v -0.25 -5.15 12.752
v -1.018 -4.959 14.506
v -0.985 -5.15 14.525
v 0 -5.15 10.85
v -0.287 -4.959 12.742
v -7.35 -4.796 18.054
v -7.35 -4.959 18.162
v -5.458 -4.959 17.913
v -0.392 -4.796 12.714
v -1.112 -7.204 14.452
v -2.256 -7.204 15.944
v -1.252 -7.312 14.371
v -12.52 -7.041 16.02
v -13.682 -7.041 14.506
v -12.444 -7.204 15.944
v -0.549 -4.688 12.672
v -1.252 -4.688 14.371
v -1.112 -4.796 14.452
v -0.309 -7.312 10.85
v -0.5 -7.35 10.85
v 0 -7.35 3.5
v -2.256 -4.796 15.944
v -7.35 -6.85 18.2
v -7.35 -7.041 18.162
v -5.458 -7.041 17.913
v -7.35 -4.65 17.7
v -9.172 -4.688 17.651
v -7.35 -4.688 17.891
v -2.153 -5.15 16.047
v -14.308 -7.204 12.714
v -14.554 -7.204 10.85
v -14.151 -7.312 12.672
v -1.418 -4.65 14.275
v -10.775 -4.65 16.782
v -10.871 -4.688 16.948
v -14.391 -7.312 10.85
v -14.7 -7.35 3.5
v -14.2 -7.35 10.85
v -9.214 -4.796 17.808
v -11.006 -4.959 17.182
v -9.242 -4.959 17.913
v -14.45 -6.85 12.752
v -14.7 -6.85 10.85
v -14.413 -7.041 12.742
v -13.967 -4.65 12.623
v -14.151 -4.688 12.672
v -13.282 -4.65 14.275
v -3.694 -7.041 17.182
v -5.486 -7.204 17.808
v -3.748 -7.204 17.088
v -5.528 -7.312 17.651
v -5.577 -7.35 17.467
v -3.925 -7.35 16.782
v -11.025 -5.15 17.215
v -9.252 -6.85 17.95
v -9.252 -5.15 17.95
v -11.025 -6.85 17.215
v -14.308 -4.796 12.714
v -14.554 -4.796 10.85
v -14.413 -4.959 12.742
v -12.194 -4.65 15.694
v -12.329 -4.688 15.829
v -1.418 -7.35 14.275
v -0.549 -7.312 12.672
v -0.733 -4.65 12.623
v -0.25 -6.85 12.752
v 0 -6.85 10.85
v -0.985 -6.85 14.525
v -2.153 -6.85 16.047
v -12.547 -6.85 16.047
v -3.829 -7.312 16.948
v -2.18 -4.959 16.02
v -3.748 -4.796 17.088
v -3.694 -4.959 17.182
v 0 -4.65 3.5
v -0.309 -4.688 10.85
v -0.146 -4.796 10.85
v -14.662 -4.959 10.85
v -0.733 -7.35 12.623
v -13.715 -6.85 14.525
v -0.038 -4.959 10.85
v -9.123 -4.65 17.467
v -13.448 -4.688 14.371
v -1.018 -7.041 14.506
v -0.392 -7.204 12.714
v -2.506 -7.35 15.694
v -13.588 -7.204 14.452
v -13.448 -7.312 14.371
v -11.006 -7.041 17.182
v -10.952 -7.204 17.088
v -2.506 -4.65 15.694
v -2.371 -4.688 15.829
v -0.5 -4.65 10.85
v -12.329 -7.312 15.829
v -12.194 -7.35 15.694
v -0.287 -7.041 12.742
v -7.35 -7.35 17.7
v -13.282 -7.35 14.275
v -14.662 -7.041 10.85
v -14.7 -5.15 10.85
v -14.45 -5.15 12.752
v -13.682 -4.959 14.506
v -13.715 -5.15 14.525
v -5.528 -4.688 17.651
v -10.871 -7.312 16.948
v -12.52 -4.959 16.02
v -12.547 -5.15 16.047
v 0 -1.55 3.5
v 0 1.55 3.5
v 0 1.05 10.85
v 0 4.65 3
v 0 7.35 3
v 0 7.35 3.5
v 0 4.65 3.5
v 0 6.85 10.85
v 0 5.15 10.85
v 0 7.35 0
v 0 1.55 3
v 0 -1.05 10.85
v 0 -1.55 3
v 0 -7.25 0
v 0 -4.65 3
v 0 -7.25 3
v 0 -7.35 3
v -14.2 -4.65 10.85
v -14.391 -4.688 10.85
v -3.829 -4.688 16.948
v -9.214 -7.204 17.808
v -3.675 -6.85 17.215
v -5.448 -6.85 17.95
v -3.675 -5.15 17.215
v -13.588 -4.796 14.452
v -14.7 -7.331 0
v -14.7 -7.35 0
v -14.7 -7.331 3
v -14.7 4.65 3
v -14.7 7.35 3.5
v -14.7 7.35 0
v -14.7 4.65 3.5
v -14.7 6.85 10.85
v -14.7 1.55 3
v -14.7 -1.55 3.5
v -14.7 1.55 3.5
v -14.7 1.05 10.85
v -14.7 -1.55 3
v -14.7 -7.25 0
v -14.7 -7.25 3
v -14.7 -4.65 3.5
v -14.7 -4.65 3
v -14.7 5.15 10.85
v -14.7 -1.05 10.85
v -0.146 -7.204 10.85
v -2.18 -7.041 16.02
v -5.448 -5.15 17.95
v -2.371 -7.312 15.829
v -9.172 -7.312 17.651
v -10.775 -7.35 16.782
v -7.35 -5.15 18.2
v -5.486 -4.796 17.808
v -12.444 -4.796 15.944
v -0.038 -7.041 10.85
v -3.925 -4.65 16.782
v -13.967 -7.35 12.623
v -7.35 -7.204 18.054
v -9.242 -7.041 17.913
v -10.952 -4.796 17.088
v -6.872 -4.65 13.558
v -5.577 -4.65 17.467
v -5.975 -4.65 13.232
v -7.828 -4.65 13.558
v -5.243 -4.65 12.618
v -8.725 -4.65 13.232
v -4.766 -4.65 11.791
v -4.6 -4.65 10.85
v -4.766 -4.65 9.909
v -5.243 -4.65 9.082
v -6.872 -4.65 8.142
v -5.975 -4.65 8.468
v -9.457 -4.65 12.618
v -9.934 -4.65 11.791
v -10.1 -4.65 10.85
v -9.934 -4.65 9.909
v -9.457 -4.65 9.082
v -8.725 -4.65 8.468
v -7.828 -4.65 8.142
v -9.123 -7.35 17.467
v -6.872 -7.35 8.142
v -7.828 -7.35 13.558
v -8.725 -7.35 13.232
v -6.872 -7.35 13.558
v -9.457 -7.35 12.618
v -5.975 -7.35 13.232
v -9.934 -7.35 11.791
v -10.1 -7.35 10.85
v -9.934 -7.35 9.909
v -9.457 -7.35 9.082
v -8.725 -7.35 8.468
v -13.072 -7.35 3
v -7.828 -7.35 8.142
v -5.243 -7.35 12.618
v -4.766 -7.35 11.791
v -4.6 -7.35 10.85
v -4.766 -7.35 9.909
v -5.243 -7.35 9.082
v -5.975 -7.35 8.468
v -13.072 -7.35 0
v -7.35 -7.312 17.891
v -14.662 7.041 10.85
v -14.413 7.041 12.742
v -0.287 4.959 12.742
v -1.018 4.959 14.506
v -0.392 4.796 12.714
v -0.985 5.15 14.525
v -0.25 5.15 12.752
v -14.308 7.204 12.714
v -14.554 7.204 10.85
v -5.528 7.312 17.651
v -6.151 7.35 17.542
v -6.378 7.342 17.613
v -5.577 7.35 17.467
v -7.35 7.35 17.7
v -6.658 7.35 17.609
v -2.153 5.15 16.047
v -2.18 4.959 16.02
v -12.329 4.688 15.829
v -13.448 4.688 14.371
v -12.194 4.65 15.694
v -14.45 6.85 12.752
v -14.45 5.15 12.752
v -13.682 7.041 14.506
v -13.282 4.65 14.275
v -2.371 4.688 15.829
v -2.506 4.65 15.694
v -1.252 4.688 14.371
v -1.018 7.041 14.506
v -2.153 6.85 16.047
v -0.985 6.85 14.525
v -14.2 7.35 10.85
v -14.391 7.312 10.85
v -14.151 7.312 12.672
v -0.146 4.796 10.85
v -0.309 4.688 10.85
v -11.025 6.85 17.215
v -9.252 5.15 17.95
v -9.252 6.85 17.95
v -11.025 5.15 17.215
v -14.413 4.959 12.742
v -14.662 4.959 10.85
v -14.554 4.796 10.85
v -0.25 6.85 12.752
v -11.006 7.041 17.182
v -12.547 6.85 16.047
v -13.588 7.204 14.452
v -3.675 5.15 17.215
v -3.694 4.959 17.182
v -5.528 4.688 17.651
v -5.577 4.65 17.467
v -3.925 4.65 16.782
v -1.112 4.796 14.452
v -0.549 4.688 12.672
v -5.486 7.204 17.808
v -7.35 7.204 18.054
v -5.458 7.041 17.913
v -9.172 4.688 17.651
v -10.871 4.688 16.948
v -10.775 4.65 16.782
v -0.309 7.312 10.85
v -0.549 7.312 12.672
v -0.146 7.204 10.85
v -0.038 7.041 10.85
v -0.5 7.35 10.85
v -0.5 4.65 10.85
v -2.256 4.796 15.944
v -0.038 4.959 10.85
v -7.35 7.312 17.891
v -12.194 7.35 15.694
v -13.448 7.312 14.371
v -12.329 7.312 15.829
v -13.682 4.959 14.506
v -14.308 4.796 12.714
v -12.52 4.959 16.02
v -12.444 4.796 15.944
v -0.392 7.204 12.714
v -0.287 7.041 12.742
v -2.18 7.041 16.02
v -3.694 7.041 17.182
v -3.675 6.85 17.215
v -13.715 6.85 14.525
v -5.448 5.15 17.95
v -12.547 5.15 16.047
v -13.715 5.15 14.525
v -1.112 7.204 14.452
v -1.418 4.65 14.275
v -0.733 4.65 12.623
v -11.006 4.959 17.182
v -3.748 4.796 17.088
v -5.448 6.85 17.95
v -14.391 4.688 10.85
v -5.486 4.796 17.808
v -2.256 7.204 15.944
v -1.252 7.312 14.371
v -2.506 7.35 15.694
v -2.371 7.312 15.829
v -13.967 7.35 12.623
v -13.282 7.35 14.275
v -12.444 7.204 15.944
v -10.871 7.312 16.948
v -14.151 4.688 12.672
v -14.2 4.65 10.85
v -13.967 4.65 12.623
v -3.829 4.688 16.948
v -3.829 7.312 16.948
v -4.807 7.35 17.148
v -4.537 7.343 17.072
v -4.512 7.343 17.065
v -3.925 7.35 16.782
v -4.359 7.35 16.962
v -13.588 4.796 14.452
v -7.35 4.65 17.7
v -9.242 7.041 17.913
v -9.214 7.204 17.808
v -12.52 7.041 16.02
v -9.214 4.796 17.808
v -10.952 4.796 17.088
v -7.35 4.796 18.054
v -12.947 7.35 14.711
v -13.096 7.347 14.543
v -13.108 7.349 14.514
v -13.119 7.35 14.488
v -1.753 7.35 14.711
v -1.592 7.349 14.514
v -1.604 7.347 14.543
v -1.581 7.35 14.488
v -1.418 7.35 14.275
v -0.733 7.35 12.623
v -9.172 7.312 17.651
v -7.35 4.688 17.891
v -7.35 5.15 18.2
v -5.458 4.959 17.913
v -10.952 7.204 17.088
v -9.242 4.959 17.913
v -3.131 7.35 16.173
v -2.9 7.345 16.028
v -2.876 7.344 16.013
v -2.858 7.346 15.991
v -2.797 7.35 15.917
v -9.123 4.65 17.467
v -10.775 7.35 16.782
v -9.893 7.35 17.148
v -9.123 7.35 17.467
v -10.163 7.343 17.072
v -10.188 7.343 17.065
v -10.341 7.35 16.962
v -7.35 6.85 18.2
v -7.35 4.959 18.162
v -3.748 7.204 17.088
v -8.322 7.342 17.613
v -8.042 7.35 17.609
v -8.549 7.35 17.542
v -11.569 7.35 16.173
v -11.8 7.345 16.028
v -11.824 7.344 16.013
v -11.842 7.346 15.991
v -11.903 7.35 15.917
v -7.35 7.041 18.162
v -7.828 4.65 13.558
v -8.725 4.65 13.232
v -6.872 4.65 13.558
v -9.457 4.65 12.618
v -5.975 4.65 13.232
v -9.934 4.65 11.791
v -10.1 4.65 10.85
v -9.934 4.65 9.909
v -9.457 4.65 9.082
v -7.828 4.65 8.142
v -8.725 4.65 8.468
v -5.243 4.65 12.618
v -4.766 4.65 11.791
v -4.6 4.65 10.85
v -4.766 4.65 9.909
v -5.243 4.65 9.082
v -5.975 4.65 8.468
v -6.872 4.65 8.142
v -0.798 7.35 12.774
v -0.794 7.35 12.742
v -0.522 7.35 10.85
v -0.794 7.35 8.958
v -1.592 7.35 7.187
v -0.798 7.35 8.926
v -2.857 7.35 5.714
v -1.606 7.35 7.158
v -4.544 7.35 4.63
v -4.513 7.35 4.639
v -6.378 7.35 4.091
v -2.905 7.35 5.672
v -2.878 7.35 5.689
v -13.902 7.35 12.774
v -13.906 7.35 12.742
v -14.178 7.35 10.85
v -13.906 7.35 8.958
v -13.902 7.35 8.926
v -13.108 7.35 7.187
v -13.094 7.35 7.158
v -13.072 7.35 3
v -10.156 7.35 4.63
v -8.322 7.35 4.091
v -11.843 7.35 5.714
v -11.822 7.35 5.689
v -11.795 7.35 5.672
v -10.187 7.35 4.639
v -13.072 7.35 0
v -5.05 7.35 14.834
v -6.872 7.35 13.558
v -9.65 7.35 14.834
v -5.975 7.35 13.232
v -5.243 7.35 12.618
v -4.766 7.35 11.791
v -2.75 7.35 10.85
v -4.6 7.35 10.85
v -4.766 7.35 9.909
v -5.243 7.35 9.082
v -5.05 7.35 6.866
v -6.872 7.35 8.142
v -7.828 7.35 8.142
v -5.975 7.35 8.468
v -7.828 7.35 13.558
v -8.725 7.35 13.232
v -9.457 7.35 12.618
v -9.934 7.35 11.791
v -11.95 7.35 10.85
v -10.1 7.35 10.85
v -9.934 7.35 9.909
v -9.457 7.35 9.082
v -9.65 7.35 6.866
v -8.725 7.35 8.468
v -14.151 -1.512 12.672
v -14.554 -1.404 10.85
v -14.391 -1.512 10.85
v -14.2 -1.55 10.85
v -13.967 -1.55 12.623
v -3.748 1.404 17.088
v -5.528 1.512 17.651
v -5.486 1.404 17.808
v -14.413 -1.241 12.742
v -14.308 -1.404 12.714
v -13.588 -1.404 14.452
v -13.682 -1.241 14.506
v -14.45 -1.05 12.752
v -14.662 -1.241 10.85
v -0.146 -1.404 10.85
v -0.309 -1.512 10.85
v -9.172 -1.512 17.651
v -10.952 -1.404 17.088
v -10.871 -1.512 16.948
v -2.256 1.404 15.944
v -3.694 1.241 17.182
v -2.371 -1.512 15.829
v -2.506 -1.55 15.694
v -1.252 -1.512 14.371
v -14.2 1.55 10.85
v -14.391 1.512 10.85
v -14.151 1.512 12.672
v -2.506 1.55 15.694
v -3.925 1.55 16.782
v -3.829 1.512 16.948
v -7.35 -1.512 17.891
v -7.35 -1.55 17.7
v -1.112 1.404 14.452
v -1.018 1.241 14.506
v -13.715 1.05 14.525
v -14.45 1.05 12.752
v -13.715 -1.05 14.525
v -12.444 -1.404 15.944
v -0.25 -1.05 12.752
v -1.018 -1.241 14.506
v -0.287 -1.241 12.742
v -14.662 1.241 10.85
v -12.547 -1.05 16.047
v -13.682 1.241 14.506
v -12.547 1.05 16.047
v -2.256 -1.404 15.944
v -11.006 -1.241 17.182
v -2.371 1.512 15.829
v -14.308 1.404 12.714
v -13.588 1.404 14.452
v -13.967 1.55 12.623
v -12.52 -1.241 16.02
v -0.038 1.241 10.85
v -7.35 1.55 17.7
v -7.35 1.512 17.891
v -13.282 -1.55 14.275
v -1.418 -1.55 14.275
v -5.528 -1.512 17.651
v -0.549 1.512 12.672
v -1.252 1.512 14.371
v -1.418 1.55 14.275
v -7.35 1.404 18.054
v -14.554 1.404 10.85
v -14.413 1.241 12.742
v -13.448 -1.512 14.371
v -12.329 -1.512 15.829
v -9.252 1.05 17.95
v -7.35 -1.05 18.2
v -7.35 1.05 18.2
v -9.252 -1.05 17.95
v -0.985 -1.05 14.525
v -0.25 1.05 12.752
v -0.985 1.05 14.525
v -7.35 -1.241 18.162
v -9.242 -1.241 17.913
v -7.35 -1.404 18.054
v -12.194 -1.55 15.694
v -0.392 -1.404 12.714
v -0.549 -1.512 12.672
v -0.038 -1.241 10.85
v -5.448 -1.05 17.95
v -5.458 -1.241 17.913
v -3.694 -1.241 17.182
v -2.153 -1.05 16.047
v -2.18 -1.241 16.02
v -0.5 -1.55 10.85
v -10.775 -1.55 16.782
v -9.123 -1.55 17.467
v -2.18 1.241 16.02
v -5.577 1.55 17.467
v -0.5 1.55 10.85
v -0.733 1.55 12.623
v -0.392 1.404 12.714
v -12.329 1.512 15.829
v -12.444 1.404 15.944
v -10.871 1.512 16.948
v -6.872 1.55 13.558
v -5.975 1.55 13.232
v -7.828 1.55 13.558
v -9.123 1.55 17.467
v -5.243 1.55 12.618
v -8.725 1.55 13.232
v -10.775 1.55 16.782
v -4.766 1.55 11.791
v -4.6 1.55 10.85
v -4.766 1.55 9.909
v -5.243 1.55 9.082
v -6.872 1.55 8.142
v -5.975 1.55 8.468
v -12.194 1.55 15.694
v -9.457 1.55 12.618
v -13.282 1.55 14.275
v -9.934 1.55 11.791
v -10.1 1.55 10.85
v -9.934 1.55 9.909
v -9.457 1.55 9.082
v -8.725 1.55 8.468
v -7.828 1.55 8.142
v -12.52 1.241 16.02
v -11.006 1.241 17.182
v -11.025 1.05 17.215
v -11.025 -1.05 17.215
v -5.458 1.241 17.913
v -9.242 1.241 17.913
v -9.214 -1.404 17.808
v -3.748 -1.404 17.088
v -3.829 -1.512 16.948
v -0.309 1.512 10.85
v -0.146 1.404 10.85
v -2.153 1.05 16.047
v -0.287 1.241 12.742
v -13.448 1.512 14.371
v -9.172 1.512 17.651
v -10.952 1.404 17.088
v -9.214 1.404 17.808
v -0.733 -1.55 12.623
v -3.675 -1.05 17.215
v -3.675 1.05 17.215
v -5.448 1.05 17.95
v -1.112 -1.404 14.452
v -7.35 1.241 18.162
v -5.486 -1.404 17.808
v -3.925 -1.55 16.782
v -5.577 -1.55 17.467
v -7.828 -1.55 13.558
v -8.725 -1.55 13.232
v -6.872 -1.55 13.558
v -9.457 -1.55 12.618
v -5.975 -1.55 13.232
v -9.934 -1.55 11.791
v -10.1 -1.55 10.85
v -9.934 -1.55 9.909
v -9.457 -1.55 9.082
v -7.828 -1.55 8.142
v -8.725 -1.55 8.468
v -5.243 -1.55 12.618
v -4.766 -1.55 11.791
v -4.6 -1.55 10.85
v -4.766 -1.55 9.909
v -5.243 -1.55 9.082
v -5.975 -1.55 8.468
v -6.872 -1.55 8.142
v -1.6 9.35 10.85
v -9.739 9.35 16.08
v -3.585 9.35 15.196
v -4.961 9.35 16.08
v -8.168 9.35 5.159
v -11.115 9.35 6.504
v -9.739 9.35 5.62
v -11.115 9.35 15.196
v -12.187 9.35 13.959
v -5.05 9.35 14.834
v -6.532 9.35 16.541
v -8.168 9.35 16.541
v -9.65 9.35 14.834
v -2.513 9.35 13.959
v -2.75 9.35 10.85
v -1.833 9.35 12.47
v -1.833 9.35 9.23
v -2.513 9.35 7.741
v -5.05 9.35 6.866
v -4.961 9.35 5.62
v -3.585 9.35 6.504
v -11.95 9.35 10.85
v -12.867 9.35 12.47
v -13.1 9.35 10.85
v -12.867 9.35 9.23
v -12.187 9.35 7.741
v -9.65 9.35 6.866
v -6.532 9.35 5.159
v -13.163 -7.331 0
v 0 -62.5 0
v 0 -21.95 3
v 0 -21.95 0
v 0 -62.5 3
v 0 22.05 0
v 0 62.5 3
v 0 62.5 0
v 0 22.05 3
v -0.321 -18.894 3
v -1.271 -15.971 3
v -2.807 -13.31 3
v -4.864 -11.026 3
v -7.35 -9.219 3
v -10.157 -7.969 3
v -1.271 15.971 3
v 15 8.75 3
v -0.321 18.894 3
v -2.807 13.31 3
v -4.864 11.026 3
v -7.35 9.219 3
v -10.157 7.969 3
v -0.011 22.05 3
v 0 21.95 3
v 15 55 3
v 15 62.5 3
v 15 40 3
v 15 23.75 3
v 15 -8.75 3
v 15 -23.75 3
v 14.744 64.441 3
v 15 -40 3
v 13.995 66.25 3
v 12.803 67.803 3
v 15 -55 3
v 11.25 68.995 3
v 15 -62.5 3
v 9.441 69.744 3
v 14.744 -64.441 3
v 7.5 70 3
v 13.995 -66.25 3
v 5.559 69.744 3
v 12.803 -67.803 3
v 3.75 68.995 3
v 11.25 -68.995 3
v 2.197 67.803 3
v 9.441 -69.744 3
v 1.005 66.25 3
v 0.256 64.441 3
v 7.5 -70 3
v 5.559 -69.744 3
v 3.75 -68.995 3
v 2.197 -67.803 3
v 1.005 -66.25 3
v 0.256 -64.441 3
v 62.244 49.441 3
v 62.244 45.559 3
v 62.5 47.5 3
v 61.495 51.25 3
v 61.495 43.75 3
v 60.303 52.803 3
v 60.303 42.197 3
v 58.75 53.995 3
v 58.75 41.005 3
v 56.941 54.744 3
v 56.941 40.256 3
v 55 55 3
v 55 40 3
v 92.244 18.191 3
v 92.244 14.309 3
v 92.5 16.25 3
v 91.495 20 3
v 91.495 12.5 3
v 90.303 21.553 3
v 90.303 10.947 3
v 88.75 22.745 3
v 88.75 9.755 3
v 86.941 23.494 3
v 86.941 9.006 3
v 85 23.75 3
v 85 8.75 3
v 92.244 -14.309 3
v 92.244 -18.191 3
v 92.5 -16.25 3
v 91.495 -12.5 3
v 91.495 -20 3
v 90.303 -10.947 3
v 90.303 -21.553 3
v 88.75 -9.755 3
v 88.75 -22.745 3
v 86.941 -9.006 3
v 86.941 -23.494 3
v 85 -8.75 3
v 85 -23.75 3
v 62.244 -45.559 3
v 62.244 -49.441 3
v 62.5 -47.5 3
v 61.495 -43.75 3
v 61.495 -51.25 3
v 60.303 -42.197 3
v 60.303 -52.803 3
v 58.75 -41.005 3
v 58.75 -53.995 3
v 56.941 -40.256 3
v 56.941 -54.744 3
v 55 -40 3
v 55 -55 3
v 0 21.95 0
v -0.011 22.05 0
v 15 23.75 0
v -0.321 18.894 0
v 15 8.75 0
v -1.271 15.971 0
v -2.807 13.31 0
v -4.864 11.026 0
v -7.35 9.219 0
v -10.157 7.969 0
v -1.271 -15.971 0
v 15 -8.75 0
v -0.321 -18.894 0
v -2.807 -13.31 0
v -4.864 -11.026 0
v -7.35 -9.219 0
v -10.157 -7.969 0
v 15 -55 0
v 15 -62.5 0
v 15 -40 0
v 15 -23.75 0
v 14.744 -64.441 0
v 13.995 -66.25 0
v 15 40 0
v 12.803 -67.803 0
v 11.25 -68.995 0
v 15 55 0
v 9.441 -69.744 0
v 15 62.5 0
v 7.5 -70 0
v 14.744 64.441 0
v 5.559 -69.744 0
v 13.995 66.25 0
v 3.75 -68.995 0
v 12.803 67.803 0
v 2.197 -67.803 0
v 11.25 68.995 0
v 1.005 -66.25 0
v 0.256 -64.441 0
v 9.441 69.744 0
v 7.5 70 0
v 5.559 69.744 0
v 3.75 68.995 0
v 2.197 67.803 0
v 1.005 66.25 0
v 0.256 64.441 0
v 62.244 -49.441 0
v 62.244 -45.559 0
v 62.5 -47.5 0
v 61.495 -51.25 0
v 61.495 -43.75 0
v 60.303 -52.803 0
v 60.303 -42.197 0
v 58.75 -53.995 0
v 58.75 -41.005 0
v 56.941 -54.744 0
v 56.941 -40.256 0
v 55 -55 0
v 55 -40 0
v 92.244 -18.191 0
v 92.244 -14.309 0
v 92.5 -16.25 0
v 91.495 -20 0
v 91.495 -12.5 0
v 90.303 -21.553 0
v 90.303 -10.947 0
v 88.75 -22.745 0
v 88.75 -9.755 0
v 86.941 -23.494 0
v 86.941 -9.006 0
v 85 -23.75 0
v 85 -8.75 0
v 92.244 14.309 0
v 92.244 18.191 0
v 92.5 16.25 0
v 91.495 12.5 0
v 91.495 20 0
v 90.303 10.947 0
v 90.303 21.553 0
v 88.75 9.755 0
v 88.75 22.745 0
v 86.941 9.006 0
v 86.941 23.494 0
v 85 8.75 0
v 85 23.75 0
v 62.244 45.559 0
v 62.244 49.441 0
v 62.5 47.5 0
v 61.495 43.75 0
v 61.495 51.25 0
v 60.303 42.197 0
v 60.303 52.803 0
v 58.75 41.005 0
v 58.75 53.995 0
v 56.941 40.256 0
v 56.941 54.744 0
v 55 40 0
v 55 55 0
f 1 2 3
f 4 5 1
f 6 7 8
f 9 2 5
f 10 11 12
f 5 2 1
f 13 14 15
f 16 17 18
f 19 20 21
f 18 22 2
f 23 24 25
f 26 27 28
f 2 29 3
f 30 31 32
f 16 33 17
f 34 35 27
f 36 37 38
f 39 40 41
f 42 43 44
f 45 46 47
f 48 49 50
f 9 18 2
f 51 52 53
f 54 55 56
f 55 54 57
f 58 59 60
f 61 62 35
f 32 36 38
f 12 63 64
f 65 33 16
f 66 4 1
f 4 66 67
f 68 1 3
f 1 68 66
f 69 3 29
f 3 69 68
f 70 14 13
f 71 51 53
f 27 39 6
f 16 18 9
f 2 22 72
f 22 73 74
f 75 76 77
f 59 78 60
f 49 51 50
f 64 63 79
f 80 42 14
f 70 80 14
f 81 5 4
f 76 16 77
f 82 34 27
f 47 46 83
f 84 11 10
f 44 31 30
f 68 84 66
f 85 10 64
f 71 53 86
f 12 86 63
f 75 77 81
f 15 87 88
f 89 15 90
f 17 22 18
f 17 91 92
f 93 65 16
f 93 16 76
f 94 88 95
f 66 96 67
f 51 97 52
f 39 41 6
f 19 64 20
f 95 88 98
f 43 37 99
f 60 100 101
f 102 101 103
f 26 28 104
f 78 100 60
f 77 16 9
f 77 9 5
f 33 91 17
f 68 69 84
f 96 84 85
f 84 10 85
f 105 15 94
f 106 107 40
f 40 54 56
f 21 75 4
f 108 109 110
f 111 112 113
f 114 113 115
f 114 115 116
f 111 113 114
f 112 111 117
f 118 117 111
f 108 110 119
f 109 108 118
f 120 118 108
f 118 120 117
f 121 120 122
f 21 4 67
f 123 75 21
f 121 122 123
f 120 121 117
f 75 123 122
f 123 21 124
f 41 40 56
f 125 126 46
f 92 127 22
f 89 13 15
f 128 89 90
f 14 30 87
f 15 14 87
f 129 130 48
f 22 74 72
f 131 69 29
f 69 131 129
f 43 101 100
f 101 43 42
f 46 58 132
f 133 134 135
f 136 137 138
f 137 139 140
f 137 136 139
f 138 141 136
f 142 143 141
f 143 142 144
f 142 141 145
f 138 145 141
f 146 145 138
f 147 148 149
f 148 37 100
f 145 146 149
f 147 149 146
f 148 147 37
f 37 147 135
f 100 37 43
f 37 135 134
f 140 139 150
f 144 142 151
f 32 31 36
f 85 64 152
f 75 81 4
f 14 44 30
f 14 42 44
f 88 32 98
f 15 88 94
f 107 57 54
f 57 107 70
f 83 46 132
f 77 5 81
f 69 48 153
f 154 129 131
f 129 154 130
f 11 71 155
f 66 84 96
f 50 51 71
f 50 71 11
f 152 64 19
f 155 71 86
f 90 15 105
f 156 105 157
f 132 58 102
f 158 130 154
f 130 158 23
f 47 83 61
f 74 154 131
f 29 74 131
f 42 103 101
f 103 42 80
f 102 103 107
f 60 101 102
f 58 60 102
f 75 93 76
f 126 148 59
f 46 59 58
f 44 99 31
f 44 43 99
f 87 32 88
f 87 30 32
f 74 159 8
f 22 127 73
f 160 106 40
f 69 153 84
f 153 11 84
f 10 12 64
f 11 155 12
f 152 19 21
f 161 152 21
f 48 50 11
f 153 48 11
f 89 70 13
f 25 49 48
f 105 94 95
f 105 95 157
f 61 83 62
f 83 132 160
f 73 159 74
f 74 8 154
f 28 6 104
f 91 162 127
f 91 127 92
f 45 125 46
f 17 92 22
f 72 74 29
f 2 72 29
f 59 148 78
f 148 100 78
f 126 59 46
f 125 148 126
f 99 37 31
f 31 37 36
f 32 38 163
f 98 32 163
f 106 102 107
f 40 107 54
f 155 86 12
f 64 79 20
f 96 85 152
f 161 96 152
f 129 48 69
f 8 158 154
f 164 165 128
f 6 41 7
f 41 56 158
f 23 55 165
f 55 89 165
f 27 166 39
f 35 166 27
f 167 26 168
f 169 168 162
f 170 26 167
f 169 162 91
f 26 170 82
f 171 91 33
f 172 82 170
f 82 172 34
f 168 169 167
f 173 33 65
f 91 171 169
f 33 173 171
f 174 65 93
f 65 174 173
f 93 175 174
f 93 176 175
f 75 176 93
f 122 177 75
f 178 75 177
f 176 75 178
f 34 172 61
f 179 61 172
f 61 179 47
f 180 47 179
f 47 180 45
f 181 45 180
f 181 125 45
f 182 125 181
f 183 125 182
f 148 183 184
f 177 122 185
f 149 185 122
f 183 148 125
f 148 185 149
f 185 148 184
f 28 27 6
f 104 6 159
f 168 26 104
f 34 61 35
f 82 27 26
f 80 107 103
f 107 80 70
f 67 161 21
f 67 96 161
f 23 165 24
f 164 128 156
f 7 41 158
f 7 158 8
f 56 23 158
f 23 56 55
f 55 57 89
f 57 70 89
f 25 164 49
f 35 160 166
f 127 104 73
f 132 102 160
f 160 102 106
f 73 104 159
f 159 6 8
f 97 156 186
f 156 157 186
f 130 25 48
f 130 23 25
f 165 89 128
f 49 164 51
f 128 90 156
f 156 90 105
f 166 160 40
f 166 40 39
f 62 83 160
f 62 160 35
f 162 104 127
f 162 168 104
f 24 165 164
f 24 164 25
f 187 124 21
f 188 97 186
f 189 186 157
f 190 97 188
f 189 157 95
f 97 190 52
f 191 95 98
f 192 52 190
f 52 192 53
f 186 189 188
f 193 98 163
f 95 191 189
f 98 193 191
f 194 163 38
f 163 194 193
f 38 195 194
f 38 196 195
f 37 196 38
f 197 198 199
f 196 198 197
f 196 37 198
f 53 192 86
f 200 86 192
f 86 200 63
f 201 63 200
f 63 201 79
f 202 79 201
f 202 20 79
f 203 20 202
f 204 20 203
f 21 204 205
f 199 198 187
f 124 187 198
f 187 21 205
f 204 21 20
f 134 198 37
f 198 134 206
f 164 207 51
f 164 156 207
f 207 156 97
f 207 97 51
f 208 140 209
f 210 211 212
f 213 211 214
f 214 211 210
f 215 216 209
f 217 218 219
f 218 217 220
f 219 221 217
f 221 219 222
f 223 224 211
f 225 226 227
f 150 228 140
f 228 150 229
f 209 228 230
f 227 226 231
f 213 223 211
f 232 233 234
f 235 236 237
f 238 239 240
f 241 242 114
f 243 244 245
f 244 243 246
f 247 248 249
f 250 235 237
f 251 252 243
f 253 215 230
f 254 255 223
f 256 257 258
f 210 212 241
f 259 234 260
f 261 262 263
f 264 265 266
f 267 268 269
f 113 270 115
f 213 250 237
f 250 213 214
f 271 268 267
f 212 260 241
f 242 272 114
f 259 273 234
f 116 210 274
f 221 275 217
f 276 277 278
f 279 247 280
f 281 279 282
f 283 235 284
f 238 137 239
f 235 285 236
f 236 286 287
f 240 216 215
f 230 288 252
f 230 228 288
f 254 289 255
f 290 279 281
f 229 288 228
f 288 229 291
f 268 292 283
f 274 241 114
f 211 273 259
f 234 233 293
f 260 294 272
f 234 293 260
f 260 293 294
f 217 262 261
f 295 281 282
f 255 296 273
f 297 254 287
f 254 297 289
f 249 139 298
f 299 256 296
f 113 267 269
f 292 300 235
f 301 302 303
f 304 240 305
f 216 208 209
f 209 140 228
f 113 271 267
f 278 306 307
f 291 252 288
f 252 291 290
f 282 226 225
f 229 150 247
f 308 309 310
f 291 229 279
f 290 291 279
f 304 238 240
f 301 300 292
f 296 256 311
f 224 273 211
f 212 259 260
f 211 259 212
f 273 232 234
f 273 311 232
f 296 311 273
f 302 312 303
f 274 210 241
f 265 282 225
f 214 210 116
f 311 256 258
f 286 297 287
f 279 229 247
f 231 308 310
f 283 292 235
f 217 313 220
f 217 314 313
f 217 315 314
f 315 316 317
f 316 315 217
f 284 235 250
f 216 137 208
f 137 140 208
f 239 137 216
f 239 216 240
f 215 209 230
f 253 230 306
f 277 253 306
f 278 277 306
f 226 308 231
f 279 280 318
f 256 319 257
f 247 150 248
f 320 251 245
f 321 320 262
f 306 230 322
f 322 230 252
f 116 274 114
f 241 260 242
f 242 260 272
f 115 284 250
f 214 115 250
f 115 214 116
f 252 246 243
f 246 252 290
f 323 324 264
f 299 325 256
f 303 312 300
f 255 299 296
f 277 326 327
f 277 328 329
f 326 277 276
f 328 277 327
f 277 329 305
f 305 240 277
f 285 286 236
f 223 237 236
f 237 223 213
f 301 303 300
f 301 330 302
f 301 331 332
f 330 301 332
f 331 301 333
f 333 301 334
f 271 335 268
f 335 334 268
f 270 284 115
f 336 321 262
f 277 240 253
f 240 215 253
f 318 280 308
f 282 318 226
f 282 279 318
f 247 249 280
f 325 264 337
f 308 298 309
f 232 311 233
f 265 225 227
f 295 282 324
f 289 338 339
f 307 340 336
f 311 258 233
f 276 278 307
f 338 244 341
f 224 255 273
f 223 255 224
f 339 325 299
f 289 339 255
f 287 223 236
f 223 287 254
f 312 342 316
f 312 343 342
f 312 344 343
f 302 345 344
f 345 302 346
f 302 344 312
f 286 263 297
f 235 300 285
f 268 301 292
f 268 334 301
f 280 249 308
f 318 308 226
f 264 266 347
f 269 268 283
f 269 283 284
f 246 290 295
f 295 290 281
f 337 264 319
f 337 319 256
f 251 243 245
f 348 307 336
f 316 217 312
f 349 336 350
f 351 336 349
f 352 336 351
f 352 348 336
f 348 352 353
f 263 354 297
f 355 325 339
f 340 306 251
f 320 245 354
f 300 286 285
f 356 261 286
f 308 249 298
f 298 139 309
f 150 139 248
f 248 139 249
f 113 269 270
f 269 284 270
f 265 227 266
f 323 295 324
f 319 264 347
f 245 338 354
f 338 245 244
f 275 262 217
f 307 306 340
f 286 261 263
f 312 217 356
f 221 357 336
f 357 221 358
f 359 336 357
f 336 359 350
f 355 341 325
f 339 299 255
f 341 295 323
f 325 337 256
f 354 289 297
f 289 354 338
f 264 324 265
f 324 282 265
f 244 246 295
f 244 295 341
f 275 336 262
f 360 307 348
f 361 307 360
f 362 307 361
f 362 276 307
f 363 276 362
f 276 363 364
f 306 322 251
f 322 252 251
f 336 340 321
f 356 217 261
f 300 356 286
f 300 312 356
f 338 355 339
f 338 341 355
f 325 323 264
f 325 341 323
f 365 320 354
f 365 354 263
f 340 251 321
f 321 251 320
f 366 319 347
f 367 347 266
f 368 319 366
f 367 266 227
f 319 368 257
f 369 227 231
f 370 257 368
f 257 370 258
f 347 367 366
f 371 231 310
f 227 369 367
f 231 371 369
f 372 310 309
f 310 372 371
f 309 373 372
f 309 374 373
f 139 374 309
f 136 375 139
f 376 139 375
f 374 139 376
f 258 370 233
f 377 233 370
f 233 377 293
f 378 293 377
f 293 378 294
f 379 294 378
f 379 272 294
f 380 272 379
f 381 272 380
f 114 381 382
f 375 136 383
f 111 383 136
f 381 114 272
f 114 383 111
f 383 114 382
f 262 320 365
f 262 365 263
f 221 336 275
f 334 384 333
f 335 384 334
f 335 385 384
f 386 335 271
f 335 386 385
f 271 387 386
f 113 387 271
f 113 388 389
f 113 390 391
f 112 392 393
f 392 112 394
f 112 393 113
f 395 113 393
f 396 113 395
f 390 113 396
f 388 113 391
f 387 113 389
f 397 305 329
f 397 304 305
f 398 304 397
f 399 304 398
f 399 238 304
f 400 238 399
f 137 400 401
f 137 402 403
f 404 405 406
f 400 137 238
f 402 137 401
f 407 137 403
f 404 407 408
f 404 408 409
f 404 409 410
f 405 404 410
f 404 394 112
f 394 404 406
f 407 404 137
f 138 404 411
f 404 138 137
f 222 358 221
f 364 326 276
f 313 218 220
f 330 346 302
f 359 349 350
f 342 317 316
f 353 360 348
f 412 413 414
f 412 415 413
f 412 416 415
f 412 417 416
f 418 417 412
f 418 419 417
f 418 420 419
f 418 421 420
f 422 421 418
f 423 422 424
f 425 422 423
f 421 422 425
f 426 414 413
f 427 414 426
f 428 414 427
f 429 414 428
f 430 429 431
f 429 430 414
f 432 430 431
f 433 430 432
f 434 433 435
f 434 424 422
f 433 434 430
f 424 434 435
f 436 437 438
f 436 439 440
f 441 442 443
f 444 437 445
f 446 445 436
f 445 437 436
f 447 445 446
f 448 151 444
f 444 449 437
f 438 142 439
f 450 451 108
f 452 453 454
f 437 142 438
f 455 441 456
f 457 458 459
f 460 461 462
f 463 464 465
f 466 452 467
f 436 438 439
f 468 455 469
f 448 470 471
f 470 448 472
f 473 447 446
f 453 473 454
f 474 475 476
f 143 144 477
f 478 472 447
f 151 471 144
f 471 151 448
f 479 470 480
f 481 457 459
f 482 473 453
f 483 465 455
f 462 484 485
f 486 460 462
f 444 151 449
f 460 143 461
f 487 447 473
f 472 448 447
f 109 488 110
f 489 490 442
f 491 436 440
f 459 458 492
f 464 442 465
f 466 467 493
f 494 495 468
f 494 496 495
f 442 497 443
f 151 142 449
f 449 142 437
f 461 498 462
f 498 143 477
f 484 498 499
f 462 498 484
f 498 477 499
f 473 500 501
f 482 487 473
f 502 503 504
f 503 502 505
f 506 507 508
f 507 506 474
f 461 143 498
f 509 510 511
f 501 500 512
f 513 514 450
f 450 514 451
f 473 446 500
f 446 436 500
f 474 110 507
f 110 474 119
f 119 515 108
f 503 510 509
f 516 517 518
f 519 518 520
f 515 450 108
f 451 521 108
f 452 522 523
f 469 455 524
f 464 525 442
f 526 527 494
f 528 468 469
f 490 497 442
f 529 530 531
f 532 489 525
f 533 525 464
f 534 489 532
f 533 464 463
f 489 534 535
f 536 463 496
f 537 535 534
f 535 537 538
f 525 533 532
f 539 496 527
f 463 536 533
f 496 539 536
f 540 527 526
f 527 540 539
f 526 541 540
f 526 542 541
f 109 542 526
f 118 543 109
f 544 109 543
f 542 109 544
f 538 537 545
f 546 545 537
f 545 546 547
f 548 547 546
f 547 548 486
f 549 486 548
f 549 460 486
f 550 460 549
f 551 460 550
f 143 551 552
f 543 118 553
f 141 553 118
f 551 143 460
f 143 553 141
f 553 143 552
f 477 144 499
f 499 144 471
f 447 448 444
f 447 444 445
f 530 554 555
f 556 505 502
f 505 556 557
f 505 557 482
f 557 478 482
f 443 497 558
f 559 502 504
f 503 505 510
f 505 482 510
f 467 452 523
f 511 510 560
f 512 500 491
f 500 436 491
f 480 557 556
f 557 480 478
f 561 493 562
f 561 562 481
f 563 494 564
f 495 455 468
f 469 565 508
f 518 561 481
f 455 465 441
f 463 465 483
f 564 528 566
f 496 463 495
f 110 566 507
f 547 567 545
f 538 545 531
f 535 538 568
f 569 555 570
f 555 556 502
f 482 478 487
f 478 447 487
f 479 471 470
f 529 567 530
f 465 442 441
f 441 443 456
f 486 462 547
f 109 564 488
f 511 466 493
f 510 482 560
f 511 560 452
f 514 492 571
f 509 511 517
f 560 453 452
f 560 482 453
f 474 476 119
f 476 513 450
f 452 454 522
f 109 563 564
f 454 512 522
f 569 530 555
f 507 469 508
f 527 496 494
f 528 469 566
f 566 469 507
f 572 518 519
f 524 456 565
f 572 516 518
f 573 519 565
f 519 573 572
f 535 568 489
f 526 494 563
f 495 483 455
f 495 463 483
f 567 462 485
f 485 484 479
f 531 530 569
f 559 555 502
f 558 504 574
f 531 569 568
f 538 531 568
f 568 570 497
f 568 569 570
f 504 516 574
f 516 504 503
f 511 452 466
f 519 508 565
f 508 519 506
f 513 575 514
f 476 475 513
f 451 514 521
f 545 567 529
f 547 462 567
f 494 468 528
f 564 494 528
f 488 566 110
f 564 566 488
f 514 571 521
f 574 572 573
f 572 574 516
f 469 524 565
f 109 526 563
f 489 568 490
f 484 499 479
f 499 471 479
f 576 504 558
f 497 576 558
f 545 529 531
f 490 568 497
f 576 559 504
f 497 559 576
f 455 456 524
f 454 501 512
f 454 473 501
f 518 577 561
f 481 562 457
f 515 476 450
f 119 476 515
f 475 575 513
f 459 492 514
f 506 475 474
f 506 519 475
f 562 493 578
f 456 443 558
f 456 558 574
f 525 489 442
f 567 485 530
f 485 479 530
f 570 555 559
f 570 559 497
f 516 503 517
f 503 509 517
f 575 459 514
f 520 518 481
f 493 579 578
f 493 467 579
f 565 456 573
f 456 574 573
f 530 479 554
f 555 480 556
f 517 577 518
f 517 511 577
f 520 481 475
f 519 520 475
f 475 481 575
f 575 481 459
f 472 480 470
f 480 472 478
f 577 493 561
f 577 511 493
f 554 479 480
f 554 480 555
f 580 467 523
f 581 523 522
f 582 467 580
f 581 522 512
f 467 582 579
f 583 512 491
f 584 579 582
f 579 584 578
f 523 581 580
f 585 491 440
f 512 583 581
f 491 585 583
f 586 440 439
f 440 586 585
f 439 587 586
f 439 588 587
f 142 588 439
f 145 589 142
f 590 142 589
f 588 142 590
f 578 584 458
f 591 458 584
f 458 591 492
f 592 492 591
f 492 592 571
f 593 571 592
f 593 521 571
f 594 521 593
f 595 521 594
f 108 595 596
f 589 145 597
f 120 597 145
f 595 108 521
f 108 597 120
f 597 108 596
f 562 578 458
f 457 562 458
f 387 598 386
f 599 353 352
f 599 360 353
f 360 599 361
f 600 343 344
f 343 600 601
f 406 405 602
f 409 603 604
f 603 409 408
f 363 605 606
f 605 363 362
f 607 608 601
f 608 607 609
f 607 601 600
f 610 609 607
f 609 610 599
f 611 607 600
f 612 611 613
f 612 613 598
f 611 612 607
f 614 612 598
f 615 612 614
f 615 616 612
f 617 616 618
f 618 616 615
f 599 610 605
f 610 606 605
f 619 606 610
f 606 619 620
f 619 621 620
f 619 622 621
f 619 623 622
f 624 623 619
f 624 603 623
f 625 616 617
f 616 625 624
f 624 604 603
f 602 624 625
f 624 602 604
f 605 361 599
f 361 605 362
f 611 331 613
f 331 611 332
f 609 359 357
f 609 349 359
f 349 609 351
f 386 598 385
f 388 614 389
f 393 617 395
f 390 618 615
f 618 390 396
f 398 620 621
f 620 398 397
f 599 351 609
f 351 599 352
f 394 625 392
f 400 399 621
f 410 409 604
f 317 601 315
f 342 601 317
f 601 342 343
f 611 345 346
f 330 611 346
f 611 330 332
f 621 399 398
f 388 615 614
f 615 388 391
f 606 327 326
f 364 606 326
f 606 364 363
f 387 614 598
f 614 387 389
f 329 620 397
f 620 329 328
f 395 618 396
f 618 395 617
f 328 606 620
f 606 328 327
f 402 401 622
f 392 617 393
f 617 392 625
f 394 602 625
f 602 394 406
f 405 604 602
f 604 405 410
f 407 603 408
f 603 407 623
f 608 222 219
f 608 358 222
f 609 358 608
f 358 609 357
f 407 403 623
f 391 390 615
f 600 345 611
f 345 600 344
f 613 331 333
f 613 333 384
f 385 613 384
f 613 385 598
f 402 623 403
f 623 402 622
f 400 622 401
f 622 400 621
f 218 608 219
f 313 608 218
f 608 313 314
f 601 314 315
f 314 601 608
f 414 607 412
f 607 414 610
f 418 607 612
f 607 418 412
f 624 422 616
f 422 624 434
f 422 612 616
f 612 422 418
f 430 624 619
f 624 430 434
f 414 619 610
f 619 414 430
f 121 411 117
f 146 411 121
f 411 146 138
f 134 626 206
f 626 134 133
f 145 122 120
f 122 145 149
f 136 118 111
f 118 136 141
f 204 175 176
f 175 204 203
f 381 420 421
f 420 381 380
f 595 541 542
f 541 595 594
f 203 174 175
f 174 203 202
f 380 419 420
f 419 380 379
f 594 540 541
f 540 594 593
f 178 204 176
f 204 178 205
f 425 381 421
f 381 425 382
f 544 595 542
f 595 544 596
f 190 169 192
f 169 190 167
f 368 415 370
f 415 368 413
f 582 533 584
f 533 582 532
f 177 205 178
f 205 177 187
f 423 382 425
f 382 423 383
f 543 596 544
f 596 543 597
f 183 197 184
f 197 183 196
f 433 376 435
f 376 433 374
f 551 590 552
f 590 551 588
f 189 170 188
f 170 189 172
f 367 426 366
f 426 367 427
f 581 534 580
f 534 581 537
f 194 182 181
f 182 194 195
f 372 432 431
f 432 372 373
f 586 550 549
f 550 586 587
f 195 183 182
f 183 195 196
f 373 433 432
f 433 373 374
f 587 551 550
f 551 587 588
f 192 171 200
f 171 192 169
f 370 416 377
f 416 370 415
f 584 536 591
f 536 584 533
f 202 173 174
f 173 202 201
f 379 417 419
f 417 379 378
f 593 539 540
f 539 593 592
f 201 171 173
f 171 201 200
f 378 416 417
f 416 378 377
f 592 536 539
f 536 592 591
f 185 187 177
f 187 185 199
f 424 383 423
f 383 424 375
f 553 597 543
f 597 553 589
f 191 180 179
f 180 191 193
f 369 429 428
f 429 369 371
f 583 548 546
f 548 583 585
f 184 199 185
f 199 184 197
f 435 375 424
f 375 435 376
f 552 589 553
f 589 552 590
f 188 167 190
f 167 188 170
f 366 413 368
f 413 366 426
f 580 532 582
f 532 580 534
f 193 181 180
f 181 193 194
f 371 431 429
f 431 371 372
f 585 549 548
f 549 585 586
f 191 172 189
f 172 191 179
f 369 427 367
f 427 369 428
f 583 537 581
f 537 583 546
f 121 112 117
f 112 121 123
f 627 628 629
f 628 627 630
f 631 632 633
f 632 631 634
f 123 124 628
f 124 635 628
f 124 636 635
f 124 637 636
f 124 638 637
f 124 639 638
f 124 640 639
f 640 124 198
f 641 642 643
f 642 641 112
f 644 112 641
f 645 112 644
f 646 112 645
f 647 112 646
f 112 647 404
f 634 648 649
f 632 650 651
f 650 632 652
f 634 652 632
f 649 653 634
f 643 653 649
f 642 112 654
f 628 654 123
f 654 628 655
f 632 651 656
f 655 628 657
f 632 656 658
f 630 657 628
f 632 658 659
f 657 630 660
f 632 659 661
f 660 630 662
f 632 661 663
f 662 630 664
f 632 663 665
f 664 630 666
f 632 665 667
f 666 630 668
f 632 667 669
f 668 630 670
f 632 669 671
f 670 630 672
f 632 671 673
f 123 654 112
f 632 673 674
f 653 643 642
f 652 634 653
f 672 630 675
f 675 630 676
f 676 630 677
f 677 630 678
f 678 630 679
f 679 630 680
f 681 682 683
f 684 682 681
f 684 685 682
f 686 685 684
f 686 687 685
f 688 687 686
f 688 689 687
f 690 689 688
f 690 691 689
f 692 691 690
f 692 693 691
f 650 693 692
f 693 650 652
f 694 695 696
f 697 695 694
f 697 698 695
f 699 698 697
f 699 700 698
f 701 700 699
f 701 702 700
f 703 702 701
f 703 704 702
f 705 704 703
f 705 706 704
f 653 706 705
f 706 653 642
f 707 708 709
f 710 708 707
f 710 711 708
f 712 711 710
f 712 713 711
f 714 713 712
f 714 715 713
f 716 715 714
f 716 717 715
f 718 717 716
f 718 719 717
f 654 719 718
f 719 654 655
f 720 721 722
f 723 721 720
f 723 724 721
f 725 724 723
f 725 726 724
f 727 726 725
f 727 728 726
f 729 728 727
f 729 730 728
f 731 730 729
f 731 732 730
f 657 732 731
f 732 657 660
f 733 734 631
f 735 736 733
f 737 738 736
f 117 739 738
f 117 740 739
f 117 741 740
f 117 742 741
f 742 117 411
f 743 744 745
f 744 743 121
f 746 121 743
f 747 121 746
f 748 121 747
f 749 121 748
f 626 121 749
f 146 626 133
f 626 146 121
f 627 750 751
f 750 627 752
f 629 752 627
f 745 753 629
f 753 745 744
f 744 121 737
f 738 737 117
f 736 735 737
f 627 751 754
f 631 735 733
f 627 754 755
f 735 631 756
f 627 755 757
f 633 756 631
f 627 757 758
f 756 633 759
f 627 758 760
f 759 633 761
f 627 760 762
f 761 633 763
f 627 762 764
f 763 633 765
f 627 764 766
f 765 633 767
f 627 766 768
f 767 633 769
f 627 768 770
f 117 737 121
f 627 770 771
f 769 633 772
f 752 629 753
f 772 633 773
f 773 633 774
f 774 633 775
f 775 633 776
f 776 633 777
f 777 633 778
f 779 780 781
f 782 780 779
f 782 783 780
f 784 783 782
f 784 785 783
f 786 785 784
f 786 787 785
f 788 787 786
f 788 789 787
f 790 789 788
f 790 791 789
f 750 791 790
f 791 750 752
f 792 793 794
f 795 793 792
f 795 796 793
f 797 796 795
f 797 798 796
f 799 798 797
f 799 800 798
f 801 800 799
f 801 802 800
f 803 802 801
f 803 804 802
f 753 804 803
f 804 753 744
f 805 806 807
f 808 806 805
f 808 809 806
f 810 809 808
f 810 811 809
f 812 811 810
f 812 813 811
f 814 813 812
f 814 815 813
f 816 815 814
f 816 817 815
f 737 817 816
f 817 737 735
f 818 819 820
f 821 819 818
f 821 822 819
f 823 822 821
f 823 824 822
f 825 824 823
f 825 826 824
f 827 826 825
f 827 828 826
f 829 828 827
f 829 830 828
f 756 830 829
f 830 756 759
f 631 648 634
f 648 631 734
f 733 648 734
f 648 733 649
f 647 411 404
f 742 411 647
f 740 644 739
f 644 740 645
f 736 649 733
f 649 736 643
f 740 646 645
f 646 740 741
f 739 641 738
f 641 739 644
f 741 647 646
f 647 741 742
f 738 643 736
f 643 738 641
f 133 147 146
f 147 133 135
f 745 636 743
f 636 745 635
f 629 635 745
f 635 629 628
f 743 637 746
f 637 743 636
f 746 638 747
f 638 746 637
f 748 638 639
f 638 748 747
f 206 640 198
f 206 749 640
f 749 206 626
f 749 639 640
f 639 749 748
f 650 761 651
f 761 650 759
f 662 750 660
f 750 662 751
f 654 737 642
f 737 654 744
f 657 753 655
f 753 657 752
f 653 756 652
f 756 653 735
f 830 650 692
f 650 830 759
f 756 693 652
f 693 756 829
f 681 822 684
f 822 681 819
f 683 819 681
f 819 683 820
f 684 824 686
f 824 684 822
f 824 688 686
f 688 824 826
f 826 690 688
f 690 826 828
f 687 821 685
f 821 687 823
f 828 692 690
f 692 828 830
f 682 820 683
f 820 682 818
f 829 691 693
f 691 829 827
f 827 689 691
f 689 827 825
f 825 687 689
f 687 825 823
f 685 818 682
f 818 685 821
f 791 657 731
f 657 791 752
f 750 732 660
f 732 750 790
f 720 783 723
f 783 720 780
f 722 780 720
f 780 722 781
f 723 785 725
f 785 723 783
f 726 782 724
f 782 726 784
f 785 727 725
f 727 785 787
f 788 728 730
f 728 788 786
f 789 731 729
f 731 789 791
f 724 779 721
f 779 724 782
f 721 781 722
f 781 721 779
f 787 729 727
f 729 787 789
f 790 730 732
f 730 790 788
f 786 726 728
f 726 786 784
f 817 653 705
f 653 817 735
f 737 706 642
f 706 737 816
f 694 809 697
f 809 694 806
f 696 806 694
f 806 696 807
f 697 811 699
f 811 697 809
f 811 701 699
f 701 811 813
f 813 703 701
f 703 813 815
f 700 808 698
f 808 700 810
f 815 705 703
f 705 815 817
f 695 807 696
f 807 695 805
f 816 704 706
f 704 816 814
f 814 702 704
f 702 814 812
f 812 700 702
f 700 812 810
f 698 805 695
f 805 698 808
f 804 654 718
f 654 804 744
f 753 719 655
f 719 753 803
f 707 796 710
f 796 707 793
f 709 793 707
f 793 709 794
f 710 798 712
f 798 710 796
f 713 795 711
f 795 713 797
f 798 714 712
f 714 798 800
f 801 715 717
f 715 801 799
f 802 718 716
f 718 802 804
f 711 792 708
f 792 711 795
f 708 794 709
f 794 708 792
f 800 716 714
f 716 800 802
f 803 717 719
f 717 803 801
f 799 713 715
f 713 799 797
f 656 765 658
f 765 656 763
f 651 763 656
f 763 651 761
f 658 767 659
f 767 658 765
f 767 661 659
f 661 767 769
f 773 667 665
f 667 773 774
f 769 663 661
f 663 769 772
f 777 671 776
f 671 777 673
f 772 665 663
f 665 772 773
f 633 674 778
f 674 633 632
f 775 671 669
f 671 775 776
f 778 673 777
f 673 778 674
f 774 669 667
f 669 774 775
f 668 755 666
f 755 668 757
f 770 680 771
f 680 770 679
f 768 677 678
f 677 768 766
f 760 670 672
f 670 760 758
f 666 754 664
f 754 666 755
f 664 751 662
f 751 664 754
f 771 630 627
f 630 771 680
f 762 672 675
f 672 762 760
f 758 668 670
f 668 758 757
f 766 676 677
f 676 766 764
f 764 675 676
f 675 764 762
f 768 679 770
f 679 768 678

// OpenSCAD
/* [Main] */
bar_length=125;
bar_width=15;
bar_height=3;
outer_finger_length=40;
inner_finger_length=70;

//gopro connector
rotate([-90,0,0])
translate([-gopro_connector_x/2,-gopro_connector_y-0.5,0])
    gopro_connector("triple");

//adapter supports
difference(){
translate([-gopro_connector_x,gopro_connector_x/2,0])
    cube([gopro_connector_x,gopro_connector_x,3]);
translate([-gopro_connector_x,gopro_connector_x*1.5-0.1,0])
    cylinder(h=3,r=gopro_connector_x);
}

difference(){
translate([-gopro_connector_x,-gopro_connector_x*1.5+0.1,0])
    cube([gopro_connector_x,gopro_connector_x,3]);
translate([-gopro_connector_x,-gopro_connector_x*1.5+0.1,0])
    cylinder(h=3,r=gopro_connector_x);
}


bar(bar_length, bar_width, bar_height, outer_finger_length, inner_finger_length);

module finger(bar_width, length, width, height, gap) {
    translate([bar_width,(gap/2)-width,0])
        cube([length,width,height]);
    translate([bar_width+length,(gap/2)-width/2,0])
        cylinder(h=height,r=width/2);
}

module bar(length, width, height, outer_finger_length, inner_finger_length) {
    translate([0,-length/2,0])
        cube([width,length,height]);
    
    //rounded ends
    translate([width/2,length/2,0])
        cylinder(h=height,r=width/2);
    translate([width/2,-length/2,0])
        cylinder(h=height,r=width/2);
    
    //fingers
    finger(width, outer_finger_length, width, height, length-width);
    finger(width, outer_finger_length, width, height, -length+width*3);
    finger(width, inner_finger_length, width, height, length/2-width);
    finger(width, inner_finger_length, width, height, -length/2+width*3);
}


//GoPro connector library
/* [Rod and captive nut] */

// This tab is useful only if you have selected "rod" as the secondary head. The optional rod diameter (also the captive nut internal diameter)
gopro_captive_rod_id= 3.8;
// The angle the rod makes with the axis (0 is colinear, 90 is a right angle)
gopro_captive_rod_angle= 45; // [0:90]
// Optional captive nut thickness with freeplay (tightest would be 3.2)
gopro_rod_nut_th= 3.6;
// Optional captive nut diameter with freeplay (from corner to corner)
gopro_rod_nut_od= 8.05;
// How much is the protruding output of the rod on the rod attachment (can be zero), useful if you don't want a captive nut with still a tight coupling
gopro_captive_protruding_h= 0.5;

/* [Clamp/bar mount] */

// This tab is useful only if you have selected "clamp" as the secondary head.  The optional (handle)bar diameter
gopro_bar_rod_d= 31;
// How thick is the ring around the bar
gopro_bar_th= 3.2;
// How big is the gap between the jaws
gopro_bar_gap= 2.4;
// The jaw screw diameter
gopro_bar_screw_d= 3;
// The diameter of the head of the screw
gopro_bar_screw_head_d= 6.2;
// The diameter of the nut of the screw from corner to corner (can be zero)
gopro_bar_screw_nut_d= 6.01;
// How thick are the shoulders on which to bolt (each side)
gopro_bar_screw_shoulder_th=4.5;
// Whether to reverse the bolt orientation (from which side you will screw the bolt, defaut is from the joint)
gopro_bar_screw_reversed=false; // [true,false]

/* [Hidden] */

// The gopro connector itself (you most probably do not want to change this but for the first two)

// The locking nut on the gopro mount triple arm mount (keep it tight)
gopro_nut_d= 9.2;
// How deep is this nut embossing (keep it small to avoid over-overhangs)
gopro_nut_h= 2;
// Hole diameter for the two-arm mount part
gopro_holed_two= 5;
// Hole diameter for the three-arm mount part
gopro_holed_three= 5.5;
// Thickness of the internal arm in the 3-arm mount part
gopro_connector_th3_middle= 3.1;
// Thickness of the side arms in the 3-arm mount part
gopro_connector_th3_side= 2.7;
// Thickness of the arms in the 2-arm mount part
gopro_connector_th2= 3.04;
// The gap in the 3-arm mount part for the two-arm
gopro_connector_gap= 3.1;
// How round are the 2 and 3-arm parts
gopro_connector_roundness= 1;
// How thick are the mount walls
gopro_wall_th= 3;

gopro_connector_wall_tol=0.5+0;
gopro_tol=0.04+0;

// Can be queried from the outside
gopro_connector_z= 2*gopro_connector_th3_side+gopro_connector_th3_middle+2*gopro_connector_gap;
gopro_connector_x= gopro_connector_z;
gopro_connector_y= gopro_connector_z/2+gopro_wall_th;

///////////////////////////////////////////////////////////////////////
//
// GoPro Hero mount and joint (gopro_mounts_mooncactus.scad) - Rev 1.03
//
///////////////////////////////////////////////////////////////////////
//
// CC-BY-NC 2013 jeremie.francois@gmail.com
// http://www.thingiverse.com/thing:62800
// http://betterprinter.blogspot.com
//

// It slices neatly on an ultimaker with the following parameters
//
// 0.1 mm layers (for better look & more compact FDM) -- 0.15 is still OK (and faster)
// 0.8 mm walls (loops->infill->perimeters)
// 0.8 mm bottom/top
// 100% fill (probably safer, though 30% is quite OK)
//
// Rev 1.01: fixed printing angle vs captive nut slot, added a slight freeplay
// Rev 1.02: added handle/bar mount and rounded the angles of the rod mount
// Rec 1.03: examples and first release (20130317-1234)

/* ****************************************************************

HOW TO USE IN YOUR OWN DESIGNS

use <gopro_mounts_mooncactus.scad>

// Create a "triple" gopro connector
gopro_connector("triple");

// Create a "triple" gopro connector without the locking nut shape
translate([30,0,0])
	gopro_connector("triple", withnut=false);

// Create a "double" gopro connector
translate([60,0,0])
	gopro_connector("double");

// Add a bar mount/clamp to one of the connector
translate([90,0,0])
gopro_bar_clamp(
	rod_d= 31, // rod diameter
	th= 3.2, // main thickness
	gap= 2.4, // space between the clamps
	screw_d= 3, // screw diameter
	screw_head_d= 6.2, // screw head diameter
	screw_nut_d= 6.01, // nut diameter from corner to corner
	screw_shoulder_th=4.5, // thickness of the shoulder on which the nut clamps
	screw_reversed=false	 // true to mirror the orientation of the clamp bolts
);

// Extends a connector with a mount for a rod and an optional embedded nut
translate([120,0,0])
gopro_rod_connect(
	rod_id=3.8, // rod diameter
	angle=80,  // rod angle (0 is straight, 90 is a right turn)
	nut_th=3.2, // embedded nut thickness (can be zero to disable the embedded nut)
	nut_od=7.9 // nut diameter from corner to corner
);

// How to build a linear extruded bar extender
translate([0,65,0])
{
	gopro_connector("double");
	gopro_extended(len=50, th=3)
		scale([1,-1,1])
				gopro_connector("triple");
}

// The following dimensions are useful to attach the mount to your design:
	gopro_connector_z= 14.7;
	gopro_connector_x= 14.7;
	gopro_connector_y= 10.35;


// Finally, note that the arm are designed in a way which is not the best orientation to print: you would better rotate them with, eg. rotate([0,90,0])

**************************************************************** */



// To generate the sample set in bash, just copy/paste the following in a terminal:
/*
for kind in double triple; do
	for angle in 30 80; do
		through=true
		[[ $angle == 0 ]] && through=false
		openscad -D print_it=true -D gopro_primary="\"$kind\"" -D gopro_captive_rod_angle=$angle -o gmb_${kind}_${angle}.stl gopro_mount_bit.scad
	done
	openscad -D print_it=true -D gopro_primary="\"$kind\"" -D gopro_rod_nut_th=0 -o gmb_${kind}_simple.stl gopro_mount_bit.scad
done
*/


//
// ============================= GOPRO CONNECTOR =============================
//

module gopro_torus(r,rnd)
{
	translate([0,0,rnd/2])
		rotate_extrude(convexity= 10)
			translate([r-rnd/2, 0, 0])
				circle(r= rnd/2, $fs=0.2);
}

module gopro_rcyl(r,h, centered, rnd=1)
{
	translate([0,0,center ? -h/2 : 0])
	hull() {
		translate([0,0,0]) gopro_torus(r=r, rnd=rnd);
		translate([0,0,h-rnd]) gopro_torus(r=r, rnd=rnd);
	}
}

module gopro_connector(version="double", withnut=true, captive_nut_th=0, captive_nut_od=0, captive_rod_id=0, captive_nut_angle=0)
{
	module gopro_profile(th)
	{
		hull()
		{
			gopro_torus(r=gopro_connector_z/2, rnd=gopro_connector_roundness);
			translate([0,0,th-gopro_connector_roundness])
				gopro_torus(r=gopro_connector_z/2, rnd=gopro_connector_roundness);
			translate([-gopro_connector_z/2,gopro_connector_z/2,0])
				cube([gopro_connector_z,gopro_wall_th,th]);
		}
	}
	difference()
	{
		union()
		{
			if(version=="double")
			{
				for(mz=[-1:2:+1]) scale([1,1,mz])
						translate([0,0,gopro_connector_th3_middle/2 + (gopro_connector_gap-gopro_connector_th2)/2]) gopro_profile(gopro_connector_th2);
			}
			if(version=="triple")
			{
				translate([0,0,-gopro_connector_th3_middle/2]) gopro_profile(gopro_connector_th3_middle);
				for(mz=[-1:2:+1]) scale([1,1,mz])
					translate([0,0,gopro_connector_th3_middle/2 + gopro_connector_gap]) gopro_profile(gopro_connector_th3_side);
			}

			// add the common wall
			translate([0,gopro_connector_z/2+gopro_wall_th/2+gopro_connector_wall_tol,0])
				cube([gopro_connector_z,gopro_wall_th,gopro_connector_z], center=true);

			// add the optional nut emboss
			if(version=="triple" && withnut)
			{
				translate([0,0,gopro_connector_z/2-gopro_tol])
				difference()
				{
					cylinder(r1=gopro_connector_z/2-gopro_connector_roundness/2, r2=11.5/2, h=gopro_nut_h+gopro_tol);
					cylinder(r=gopro_nut_d/2, h=gopro_connector_z/2+3.5+gopro_tol, $fn=6);
				}
			}
		}
		// remove the axis
		translate([0,0,-gopro_tol])
			cylinder(r=(version=="double" ? gopro_holed_two : gopro_holed_three)/2, h=gopro_connector_z+4*gopro_tol, center=true, $fs=1);
	}
}

//
// ============================= CAPTIVE NUT/ROD =============================
//

module gopro_rod_connect(nut_od, rod_id, nut_th, angle=0)
{
	if( (nut_th>0 && nut_od>0) || rod_id>0 )
	translate([0,gopro_connector_z,0])
	{
		difference()
		{
			// Main body mass
			difference()
			{
				hull()
				{
					translate([0,-gopro_connector_z/2+gopro_wall_th,0]) // attachment
						cube([gopro_connector_z,gopro_tol,gopro_connector_z], center=true);

					// main cylinder
					translate([gopro_connector_z/8,gopro_connector_z/4,0]) scale([0.75,0.5,1]) // optional
					gopro_rcyl(r=gopro_connector_z/2, h=gopro_connector_z, center=true, rnd=3);

					// nozzle
					rotate([0,0,angle])
						translate([0,gopro_connector_z/2-gopro_tol,0])
							rotate([-90,0,0])
							{
								hull()
								{
									translate([0,0,-1.5]) gopro_torus(r=gopro_connector_z/2, rnd=1.5);
									translate([0,0,gopro_captive_protruding_h-1])
									gopro_torus(r=nut_od/2, rnd=1);
								}
							}
				}

				// Captive nut slot
				if(nut_th>0 && nut_od>0)
				{
					translate([0,0,0])
						rotate([0,(angle<18)?180:0,angle]) // easier print only for small angles
							hull()
					{
						rotate([-90,0,0]) cylinder(r=nut_od/2, h=nut_th+2*gopro_tol, $fn=6, center=true);
						translate([gopro_connector_z,0,0])
							rotate([-90,0,0]) cylinder(r=nut_od/2, h=nut_th+2*gopro_tol, $fn=6, center=true);
					}
				}
			}

			// Carve the rod void
			if(rod_id>0)
			{
				rotate([0,0,angle])
				{
					if(angle>=80 || angle<=-80)
						rotate([-90,30,0])
							cylinder(r=rod_id/2, h=gopro_connector_z+2*gopro_captive_protruding_h+2*gopro_tol, $fs=0.2, center=true);
					else
						translate([0,gopro_wall_th+gopro_tol*2-nut_th/2,0])
							rotate([-90,30,0])
							cylinder(r=rod_id/2, h=gopro_connector_z/2+gopro_captive_protruding_h+gopro_tol, $fs=0.2);
				}
			}
		}
	}
}

//
// ============================= BAR CLAMP =============================
//

module gopro_bar_clamp(
	rod_d= 31,
	th= 3.2,
	gap= 2.4,
	screw_d= 3,
	screw_head_d= 6.2,
	screw_nut_d= 6.01,
	screw_shoulder_th=4.5,
	screw_reversed=1
	)
{
	module clamp_profile(r)
	{
		scale([r,r,1])
			translate([0,rod_d/2,0])
				cylinder(r=rod_d/2 + th,h=gopro_tol);
	}
	
	screw_x= rod_d/2+screw_head_d/2;
	translate([0,gopro_connector_z,0])
	difference()
	{
		hull()
		{
			translate([0,-gopro_connector_z/2+gopro_wall_th,0]) // attachment
				cube([gopro_connector_z,gopro_tol,gopro_connector_z], center=true);

			clamp_profile(1);
			for(m=[-1:2:+1]) scale([1,1,m])
				translate([0,0,-gopro_connector_z/2])
					clamp_profile((rod_d-0.8)/rod_d);

			// Shoulder screw support
			for(m=[-1:2:+1]) scale([m,1,1])
			{
				translate([screw_x,rod_d/2,gopro_tol/2])
					rotate([90,0,0])
						translate([0,0,-(gap+th*2)/2])
							cylinder(r=screw_head_d/2+0.78,h=gap+th*2);
			}
			
		}

		translate([0,rod_d/2,0])
		{
			// Main hole and gap
			translate([0,0,-gopro_tol-gopro_connector_z/2])
				cylinder(r=rod_d/2,h=gopro_connector_z+2*gopro_tol, $fs=1); // inner
				
			// Gap
			cube([screw_x*2 + screw_head_d*2, gap, gopro_connector_z+2*gopro_tol+1],center=true);

			// Screws
			for(mx=[-1:2:+1]) scale([mx,1,1])
			{
				translate([screw_x,0,0]) rotate([90,0,0])
				{
						translate([0,0,-rod_d/2-screw_shoulder_th]) cylinder(r=screw_d/2,h=rod_d+2*screw_shoulder_th,$fs=0.5); // screw axis
						if(screw_head_d>0)
							scale([1,1,screw_reversed?-1:1])
								translate([0,0,gap/2+screw_shoulder_th])
									cylinder(
										r1=screw_head_d/2,
										r2=1.5*screw_head_d/2,
										h=rod_d/2,$fs=0.5); // screw head
						if(screw_nut_d>0)
							scale([1,1,screw_reversed?1:-1])
								translate([0,0,gap/2+screw_shoulder_th])
									rotate([0,0,30])
										cylinder(
											r1=screw_nut_d/2,
											r2=1.5*screw_nut_d/2,
											h=rod_d/2,$fn=6); // screw nut
				}
			}

		}
	}
}


module gopro_extended(len, th=3)
{
	linlen= len - 2*gopro_connector_y;
	if(linlen>0)
	{
		translate([0,gopro_connector_y,0])
		{
			rotate([90,0,0])
				translate([0,0,-linlen/2])
					linear_extrude(height = linlen, center = true, convexity = 10)
			{
				for(r=[45:90:360]) rotate([0,0,r])
					hull()
					{
						// corners
						translate([sqrt(2)*(gopro_connector_x/2-th/2),0,0])
						{
							intersection()
							{
								rotate([0,0,45]) square([th,th],center=true);
								circle(r=1.2*th/2,$fs=0.5);
							}
						}
						circle(r=th/2);
					}
					// Internal roundness
					difference()
					{
						square([th*2,th*2],center=true);
						for(r=[0:90:360]) rotate([0,0,r])
							translate([0,th*sqrt(2)]) circle(r=th/2,$fs=0.5);
					}
			}
			translate([0,linlen+gopro_connector_y,0])
				child(0);
		}
	}
}
